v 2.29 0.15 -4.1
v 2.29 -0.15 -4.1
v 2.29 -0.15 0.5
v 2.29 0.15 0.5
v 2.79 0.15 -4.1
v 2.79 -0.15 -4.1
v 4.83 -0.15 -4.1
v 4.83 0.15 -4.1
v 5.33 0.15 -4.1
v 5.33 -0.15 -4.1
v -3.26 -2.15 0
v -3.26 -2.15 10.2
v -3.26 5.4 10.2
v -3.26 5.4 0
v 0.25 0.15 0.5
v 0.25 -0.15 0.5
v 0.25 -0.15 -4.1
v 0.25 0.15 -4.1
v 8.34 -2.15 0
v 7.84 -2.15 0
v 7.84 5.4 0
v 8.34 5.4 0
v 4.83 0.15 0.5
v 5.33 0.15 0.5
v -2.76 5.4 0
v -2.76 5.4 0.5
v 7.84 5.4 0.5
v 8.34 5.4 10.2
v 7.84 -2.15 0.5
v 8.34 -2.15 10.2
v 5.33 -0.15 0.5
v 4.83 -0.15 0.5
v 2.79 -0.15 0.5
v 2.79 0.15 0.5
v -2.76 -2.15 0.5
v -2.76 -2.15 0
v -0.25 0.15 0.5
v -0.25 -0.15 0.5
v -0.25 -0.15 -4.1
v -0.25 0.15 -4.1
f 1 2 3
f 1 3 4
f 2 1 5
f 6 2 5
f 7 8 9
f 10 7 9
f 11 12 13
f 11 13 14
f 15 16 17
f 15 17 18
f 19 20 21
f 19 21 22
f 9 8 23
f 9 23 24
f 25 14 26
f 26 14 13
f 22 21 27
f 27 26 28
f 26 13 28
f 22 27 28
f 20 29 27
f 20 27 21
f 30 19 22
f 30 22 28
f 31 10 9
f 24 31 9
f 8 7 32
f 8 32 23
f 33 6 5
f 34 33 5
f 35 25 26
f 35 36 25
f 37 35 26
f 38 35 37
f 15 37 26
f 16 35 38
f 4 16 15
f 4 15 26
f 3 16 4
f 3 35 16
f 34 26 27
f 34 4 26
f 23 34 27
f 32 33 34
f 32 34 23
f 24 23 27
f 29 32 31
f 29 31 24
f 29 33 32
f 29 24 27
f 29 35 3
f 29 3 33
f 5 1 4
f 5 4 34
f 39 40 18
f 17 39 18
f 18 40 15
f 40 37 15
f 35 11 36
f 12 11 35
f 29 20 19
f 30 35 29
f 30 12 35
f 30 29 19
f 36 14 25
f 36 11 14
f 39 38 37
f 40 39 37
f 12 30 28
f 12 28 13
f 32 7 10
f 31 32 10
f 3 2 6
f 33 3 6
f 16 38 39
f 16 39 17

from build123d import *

# Parameters (mm, degrees)
PAD_DEPTH           = 2.15
PAD_DEPTH_BACK      = 5.4
SKETCH001_W         = 0.5
SKETCH001_H         = 0.3
PAD001_DEPTH        = 0.6
PAD001_DEPTH_BACK   = 4.1
LINEARPATTERN_COUNT = 3
LINEARPATTERN_PITCH = 2.54


with BuildPart() as part:
    # Sketch → Pad (new body, two sides)
    with BuildSketch(Plane.XZ) as pad_sk:
        Polygon((-2.76, 0.5), (7.84, 0.5), (7.84, 0), (8.34, 0), (8.34, 10.2), (-3.26, 10.2), (-3.26, 0), (-2.76, 0), align=None)
    extrude(amount=PAD_DEPTH)
    extrude(pad_sk.sketch, amount=-PAD_DEPTH_BACK)

    # Sketch001 → Pad001 (join, two sides)
    with BuildSketch(Plane.XY) as pad001_sk:
        Rectangle(SKETCH001_W, SKETCH001_H)
    pad001 = extrude(amount=PAD001_DEPTH) + extrude(pad001_sk.sketch, amount=-PAD001_DEPTH_BACK)

    # LinearPattern: Pad001 ×3
    with Locations(*[(i * LINEARPATTERN_PITCH, 0, 0) for i in range(1, LINEARPATTERN_COUNT)]):
        add(pad001)


solid = part.part
